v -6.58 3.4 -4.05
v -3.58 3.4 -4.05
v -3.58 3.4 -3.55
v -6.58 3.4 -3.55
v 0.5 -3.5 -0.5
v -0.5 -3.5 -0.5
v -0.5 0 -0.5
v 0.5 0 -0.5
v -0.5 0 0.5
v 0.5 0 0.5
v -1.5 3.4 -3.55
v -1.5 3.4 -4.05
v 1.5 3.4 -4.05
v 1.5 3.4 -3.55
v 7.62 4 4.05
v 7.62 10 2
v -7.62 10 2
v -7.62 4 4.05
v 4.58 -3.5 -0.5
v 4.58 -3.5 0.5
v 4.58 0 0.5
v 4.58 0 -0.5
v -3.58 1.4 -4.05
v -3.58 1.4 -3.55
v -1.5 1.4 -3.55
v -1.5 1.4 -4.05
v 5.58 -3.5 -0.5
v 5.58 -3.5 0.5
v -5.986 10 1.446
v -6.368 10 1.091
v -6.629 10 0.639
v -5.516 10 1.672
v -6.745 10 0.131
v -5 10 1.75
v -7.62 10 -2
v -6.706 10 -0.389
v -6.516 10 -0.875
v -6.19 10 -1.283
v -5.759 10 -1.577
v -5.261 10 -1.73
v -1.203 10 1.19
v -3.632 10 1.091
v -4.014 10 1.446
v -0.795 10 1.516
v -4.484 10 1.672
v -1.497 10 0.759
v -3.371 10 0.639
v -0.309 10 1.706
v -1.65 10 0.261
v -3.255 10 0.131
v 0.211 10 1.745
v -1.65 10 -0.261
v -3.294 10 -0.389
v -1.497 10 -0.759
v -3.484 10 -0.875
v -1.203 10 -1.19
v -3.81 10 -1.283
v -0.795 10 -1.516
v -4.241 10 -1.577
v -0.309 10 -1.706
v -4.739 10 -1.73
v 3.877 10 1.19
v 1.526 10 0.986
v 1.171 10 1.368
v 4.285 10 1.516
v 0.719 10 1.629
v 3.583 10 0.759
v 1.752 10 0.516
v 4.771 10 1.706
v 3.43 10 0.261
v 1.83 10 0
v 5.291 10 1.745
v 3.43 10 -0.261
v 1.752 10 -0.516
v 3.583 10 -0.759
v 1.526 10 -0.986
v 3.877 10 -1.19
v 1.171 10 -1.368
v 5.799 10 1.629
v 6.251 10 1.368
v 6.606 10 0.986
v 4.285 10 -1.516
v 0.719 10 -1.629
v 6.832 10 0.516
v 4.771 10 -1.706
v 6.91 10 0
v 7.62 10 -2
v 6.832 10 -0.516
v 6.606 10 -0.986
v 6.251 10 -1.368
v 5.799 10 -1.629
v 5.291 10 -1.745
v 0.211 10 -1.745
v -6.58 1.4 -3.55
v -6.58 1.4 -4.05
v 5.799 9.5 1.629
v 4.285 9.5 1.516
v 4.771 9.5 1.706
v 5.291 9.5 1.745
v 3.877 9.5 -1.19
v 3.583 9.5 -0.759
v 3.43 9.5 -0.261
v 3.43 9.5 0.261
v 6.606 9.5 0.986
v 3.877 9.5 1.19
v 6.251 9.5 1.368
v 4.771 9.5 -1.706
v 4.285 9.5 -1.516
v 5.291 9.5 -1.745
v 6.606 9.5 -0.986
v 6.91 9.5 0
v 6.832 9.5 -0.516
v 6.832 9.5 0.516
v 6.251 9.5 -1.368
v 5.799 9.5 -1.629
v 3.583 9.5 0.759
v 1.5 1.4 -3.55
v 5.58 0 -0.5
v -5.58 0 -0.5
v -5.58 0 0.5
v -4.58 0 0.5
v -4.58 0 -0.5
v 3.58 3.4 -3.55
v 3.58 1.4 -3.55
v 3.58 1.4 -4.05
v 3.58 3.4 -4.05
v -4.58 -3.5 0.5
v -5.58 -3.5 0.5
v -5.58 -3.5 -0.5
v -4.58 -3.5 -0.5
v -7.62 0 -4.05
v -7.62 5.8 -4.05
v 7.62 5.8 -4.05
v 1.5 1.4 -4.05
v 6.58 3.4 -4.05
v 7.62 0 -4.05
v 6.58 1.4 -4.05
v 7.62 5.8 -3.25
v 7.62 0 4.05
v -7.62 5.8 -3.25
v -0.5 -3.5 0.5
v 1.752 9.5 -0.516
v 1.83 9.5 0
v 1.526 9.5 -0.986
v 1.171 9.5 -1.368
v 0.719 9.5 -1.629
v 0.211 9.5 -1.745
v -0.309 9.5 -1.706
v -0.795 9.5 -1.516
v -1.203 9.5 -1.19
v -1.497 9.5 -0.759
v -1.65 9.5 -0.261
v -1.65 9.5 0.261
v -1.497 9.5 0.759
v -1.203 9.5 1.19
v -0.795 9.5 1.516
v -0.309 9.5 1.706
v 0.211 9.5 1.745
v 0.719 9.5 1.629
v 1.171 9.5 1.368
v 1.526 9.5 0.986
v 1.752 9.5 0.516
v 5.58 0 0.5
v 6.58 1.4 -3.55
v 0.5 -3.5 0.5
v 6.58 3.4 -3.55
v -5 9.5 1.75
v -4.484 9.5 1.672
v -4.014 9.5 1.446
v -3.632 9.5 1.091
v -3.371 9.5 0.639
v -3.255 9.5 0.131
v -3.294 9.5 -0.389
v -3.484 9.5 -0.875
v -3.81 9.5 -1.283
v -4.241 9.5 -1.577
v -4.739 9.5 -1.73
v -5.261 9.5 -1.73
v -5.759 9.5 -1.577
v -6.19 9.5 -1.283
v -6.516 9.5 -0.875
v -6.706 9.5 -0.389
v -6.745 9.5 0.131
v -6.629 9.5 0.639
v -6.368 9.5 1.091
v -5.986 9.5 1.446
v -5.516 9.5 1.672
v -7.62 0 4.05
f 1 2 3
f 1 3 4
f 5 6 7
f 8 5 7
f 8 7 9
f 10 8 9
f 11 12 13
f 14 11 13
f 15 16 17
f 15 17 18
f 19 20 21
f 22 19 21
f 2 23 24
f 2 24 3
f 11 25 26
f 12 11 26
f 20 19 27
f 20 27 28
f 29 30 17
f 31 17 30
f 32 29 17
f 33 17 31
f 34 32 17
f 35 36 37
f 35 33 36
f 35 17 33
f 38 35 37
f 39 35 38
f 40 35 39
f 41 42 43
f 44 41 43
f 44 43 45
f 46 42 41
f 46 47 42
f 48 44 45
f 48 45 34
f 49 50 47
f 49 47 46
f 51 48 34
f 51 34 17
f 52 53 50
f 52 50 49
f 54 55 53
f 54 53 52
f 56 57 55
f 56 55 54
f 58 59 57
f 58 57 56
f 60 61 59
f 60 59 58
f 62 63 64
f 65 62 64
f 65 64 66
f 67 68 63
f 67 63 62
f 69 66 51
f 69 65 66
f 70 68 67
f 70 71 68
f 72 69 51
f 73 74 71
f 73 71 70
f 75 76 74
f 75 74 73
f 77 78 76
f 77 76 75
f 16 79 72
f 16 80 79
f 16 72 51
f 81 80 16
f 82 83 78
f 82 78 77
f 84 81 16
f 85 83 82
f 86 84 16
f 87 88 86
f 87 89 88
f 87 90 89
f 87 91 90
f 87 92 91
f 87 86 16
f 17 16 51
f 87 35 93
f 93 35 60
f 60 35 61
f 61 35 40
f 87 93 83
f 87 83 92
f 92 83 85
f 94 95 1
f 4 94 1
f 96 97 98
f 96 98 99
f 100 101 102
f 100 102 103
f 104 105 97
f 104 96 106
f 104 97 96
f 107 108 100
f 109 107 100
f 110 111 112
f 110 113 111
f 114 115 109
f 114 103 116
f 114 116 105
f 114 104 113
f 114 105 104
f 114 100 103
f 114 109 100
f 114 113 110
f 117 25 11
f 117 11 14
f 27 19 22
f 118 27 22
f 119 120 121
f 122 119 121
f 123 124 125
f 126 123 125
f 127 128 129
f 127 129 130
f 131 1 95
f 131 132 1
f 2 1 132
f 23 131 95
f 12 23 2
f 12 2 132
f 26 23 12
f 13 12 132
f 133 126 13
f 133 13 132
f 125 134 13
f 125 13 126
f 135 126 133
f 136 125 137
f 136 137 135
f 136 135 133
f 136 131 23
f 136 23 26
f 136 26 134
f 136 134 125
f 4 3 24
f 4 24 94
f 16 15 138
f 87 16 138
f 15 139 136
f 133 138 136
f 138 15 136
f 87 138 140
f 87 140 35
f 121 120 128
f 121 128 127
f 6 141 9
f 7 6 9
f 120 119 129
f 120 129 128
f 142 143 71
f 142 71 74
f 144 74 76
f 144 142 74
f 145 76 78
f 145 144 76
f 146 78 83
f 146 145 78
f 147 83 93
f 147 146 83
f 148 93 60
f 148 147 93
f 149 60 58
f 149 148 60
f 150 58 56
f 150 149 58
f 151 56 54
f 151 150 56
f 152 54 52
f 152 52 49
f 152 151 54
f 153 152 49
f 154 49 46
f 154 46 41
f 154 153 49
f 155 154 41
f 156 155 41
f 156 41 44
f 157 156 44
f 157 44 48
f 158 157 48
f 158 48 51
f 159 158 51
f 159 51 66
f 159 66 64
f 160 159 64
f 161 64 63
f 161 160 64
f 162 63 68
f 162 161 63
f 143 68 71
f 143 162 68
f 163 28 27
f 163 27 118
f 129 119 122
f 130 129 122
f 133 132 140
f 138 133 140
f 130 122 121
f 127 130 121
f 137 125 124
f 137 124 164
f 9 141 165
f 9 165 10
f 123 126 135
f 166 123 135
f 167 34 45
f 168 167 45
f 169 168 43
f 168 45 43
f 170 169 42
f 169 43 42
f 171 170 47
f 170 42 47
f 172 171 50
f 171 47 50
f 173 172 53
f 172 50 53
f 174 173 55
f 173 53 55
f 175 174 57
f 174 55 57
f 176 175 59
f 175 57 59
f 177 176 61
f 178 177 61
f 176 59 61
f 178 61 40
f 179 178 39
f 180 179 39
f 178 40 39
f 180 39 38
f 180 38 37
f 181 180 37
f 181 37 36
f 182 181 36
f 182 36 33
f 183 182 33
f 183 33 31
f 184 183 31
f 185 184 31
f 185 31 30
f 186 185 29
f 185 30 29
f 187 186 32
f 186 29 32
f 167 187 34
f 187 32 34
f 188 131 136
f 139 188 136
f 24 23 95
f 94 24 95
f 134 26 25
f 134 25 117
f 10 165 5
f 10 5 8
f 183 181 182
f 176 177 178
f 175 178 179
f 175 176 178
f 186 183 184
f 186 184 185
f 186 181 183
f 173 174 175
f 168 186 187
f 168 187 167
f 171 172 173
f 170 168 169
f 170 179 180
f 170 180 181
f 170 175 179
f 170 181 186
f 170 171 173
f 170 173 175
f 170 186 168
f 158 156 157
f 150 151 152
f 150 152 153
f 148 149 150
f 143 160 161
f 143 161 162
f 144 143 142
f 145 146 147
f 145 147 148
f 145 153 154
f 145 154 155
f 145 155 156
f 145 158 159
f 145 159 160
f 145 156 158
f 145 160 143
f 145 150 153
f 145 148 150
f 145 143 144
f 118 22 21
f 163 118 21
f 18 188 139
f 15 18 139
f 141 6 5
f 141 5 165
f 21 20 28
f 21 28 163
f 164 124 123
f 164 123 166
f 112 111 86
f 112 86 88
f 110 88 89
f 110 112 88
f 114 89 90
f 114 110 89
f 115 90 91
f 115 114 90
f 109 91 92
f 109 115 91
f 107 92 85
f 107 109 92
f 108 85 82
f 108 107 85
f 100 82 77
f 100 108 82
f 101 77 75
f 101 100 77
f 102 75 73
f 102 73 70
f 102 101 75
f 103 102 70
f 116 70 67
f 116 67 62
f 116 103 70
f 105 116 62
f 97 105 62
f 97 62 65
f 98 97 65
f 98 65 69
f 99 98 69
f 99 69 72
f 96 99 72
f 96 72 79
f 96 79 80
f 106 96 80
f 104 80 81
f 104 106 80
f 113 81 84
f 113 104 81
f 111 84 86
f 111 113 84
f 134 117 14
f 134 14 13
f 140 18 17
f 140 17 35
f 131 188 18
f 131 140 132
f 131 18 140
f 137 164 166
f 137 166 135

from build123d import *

# Parameters (mm, degrees)
SKETCH3_W             = 15.24
SKETCH3_H             = 8.1
BOSS_EXTRUDE3_DEPTH   = 10
CUT_EXTRUDE1_DEPTH    = 19.672442261
SKETCH5_R             = 1.75
CUT_EXTRUDE2_DEPTH    = 0.5
SKETCH6_W             = 3
SKETCH6_H             = 2
CUT_EXTRUDE4_DEPTH    = 0.5
SKETCH7_W             = 1
SKETCH7_H             = 1
BOSS_EXTRUDE4_DEPTH   = 3.5
LPATTERN2_START       = 4.58
LPATTERN2_OUTLINE_W   = 3.5
LPATTERN2_OUTLINE_H   = 1
LPATTERN2_DEPTH       = 1
LPATTERN2_START_2     = -0.5
LPATTERN2_2_OUTLINE_W = 3.5
LPATTERN2_2_OUTLINE_H = 1
LPATTERN2_2_DEPTH     = 1
LPATTERN2_START_3     = 9.5
LPATTERN2_3_OUTLINE_R = 1.75
LPATTERN2_3_DEPTH     = 0.5
LPATTERN2_START_4     = 1.4
LPATTERN2_4_OUTLINE_W = 3
LPATTERN2_4_OUTLINE_H = 0.5
LPATTERN2_4_DEPTH     = 2


# Read off the part's stored shape, not the designer's step: LPattern2
with BuildPart() as part:
    # Sketch3 → Boss-Extrude3 (new body)
    with BuildSketch(Plane(origin=(0, 0, 0), x_dir=(1, 0, 0), z_dir=(0, 1, 0))):
        Rectangle(SKETCH3_W, SKETCH3_H)
    extrude(amount=BOSS_EXTRUDE3_DEPTH)

    # Sketch4 → Cut-Extrude1 (cut, through all)
    with BuildSketch(Plane.ZY.offset(7.62)):
        Polygon((-3.25, 5.8), (-2, 10), (-3.25, 10), (-4.05, 10), (-4.05, 5.8), align=None)
        Polygon((4.05, 10), (2, 10), (4.05, 4), align=None)
    extrude(amount=-CUT_EXTRUDE1_DEPTH, mode=Mode.SUBTRACT)

    # Sketch5 → Cut-Extrude2 (cut)
    with BuildSketch(Plane(origin=(0, 10, 0), x_dir=(1, 0, 0), z_dir=(0, 1, 0))):
        with Locations(Location((-5, 0, 0), (0, 0, 270))):
            Circle(SKETCH5_R)
    extrude(amount=-CUT_EXTRUDE2_DEPTH, mode=Mode.SUBTRACT)

    # Sketch6 → Cut-Extrude4 (cut)
    with BuildSketch(Plane(origin=(0, 0, -4.05), x_dir=(-1, 0, 0), z_dir=(0, 0, -1))):
        with Locations((5.08, 2.4)):
            Rectangle(SKETCH6_W, SKETCH6_H)
    extrude(amount=-CUT_EXTRUDE4_DEPTH, mode=Mode.SUBTRACT)

    # LPattern2 3 outline → LPattern2 3 (cut)
    with BuildSketch(Plane(origin=(0, 0, 0), x_dir=(1, 0, 0), z_dir=(0, 1, 0)).offset(LPATTERN2_START_3)):
        with Locations((5.16, 0)):
            Circle(LPATTERN2_3_OUTLINE_R)
        with Locations((0.08, 0)):
            Circle(LPATTERN2_3_OUTLINE_R)
    extrude(amount=LPATTERN2_3_DEPTH, mode=Mode.SUBTRACT)

    # LPattern2 4 outline → LPattern2 4 (cut)
    with BuildSketch(Plane(origin=(0, 0, 0), x_dir=(1, 0, 0), z_dir=(0, 1, 0)).offset(LPATTERN2_START_4)):
        with Locations((0, 3.8)):
            Rectangle(LPATTERN2_4_OUTLINE_W, LPATTERN2_4_OUTLINE_H)
        with Locations((5.08, 3.8)):
            Rectangle(LPATTERN2_4_OUTLINE_W, LPATTERN2_4_OUTLINE_H)
    extrude(amount=LPATTERN2_4_DEPTH, mode=Mode.SUBTRACT)


with BuildPart() as body_2:
    # Sketch7 → Boss-Extrude4 (new body)
    with BuildSketch(Plane.XZ):
        with Locations((-5.08, 0)):
            Rectangle(SKETCH7_W, SKETCH7_H)
    extrude(amount=BOSS_EXTRUDE4_DEPTH)


with BuildPart() as body_3:
    # LPattern2 outline → LPattern2 (new body)
    with BuildSketch(Plane.YZ.offset(LPATTERN2_START)):
        with Locations((-1.75, 0)):
            Rectangle(LPATTERN2_OUTLINE_W, LPATTERN2_OUTLINE_H)
    extrude(amount=LPATTERN2_DEPTH)


with BuildPart() as body_4:
    # LPattern2 2 outline → LPattern2 2 (new body)
    with BuildSketch(Plane.YZ.offset(LPATTERN2_START_2)):
        with Locations((-1.75, 0)):
            Rectangle(LPATTERN2_2_OUTLINE_W, LPATTERN2_2_OUTLINE_H)
    extrude(amount=LPATTERN2_2_DEPTH)


solid = Compound([part.part, body_2.part, body_3.part, body_4.part])
